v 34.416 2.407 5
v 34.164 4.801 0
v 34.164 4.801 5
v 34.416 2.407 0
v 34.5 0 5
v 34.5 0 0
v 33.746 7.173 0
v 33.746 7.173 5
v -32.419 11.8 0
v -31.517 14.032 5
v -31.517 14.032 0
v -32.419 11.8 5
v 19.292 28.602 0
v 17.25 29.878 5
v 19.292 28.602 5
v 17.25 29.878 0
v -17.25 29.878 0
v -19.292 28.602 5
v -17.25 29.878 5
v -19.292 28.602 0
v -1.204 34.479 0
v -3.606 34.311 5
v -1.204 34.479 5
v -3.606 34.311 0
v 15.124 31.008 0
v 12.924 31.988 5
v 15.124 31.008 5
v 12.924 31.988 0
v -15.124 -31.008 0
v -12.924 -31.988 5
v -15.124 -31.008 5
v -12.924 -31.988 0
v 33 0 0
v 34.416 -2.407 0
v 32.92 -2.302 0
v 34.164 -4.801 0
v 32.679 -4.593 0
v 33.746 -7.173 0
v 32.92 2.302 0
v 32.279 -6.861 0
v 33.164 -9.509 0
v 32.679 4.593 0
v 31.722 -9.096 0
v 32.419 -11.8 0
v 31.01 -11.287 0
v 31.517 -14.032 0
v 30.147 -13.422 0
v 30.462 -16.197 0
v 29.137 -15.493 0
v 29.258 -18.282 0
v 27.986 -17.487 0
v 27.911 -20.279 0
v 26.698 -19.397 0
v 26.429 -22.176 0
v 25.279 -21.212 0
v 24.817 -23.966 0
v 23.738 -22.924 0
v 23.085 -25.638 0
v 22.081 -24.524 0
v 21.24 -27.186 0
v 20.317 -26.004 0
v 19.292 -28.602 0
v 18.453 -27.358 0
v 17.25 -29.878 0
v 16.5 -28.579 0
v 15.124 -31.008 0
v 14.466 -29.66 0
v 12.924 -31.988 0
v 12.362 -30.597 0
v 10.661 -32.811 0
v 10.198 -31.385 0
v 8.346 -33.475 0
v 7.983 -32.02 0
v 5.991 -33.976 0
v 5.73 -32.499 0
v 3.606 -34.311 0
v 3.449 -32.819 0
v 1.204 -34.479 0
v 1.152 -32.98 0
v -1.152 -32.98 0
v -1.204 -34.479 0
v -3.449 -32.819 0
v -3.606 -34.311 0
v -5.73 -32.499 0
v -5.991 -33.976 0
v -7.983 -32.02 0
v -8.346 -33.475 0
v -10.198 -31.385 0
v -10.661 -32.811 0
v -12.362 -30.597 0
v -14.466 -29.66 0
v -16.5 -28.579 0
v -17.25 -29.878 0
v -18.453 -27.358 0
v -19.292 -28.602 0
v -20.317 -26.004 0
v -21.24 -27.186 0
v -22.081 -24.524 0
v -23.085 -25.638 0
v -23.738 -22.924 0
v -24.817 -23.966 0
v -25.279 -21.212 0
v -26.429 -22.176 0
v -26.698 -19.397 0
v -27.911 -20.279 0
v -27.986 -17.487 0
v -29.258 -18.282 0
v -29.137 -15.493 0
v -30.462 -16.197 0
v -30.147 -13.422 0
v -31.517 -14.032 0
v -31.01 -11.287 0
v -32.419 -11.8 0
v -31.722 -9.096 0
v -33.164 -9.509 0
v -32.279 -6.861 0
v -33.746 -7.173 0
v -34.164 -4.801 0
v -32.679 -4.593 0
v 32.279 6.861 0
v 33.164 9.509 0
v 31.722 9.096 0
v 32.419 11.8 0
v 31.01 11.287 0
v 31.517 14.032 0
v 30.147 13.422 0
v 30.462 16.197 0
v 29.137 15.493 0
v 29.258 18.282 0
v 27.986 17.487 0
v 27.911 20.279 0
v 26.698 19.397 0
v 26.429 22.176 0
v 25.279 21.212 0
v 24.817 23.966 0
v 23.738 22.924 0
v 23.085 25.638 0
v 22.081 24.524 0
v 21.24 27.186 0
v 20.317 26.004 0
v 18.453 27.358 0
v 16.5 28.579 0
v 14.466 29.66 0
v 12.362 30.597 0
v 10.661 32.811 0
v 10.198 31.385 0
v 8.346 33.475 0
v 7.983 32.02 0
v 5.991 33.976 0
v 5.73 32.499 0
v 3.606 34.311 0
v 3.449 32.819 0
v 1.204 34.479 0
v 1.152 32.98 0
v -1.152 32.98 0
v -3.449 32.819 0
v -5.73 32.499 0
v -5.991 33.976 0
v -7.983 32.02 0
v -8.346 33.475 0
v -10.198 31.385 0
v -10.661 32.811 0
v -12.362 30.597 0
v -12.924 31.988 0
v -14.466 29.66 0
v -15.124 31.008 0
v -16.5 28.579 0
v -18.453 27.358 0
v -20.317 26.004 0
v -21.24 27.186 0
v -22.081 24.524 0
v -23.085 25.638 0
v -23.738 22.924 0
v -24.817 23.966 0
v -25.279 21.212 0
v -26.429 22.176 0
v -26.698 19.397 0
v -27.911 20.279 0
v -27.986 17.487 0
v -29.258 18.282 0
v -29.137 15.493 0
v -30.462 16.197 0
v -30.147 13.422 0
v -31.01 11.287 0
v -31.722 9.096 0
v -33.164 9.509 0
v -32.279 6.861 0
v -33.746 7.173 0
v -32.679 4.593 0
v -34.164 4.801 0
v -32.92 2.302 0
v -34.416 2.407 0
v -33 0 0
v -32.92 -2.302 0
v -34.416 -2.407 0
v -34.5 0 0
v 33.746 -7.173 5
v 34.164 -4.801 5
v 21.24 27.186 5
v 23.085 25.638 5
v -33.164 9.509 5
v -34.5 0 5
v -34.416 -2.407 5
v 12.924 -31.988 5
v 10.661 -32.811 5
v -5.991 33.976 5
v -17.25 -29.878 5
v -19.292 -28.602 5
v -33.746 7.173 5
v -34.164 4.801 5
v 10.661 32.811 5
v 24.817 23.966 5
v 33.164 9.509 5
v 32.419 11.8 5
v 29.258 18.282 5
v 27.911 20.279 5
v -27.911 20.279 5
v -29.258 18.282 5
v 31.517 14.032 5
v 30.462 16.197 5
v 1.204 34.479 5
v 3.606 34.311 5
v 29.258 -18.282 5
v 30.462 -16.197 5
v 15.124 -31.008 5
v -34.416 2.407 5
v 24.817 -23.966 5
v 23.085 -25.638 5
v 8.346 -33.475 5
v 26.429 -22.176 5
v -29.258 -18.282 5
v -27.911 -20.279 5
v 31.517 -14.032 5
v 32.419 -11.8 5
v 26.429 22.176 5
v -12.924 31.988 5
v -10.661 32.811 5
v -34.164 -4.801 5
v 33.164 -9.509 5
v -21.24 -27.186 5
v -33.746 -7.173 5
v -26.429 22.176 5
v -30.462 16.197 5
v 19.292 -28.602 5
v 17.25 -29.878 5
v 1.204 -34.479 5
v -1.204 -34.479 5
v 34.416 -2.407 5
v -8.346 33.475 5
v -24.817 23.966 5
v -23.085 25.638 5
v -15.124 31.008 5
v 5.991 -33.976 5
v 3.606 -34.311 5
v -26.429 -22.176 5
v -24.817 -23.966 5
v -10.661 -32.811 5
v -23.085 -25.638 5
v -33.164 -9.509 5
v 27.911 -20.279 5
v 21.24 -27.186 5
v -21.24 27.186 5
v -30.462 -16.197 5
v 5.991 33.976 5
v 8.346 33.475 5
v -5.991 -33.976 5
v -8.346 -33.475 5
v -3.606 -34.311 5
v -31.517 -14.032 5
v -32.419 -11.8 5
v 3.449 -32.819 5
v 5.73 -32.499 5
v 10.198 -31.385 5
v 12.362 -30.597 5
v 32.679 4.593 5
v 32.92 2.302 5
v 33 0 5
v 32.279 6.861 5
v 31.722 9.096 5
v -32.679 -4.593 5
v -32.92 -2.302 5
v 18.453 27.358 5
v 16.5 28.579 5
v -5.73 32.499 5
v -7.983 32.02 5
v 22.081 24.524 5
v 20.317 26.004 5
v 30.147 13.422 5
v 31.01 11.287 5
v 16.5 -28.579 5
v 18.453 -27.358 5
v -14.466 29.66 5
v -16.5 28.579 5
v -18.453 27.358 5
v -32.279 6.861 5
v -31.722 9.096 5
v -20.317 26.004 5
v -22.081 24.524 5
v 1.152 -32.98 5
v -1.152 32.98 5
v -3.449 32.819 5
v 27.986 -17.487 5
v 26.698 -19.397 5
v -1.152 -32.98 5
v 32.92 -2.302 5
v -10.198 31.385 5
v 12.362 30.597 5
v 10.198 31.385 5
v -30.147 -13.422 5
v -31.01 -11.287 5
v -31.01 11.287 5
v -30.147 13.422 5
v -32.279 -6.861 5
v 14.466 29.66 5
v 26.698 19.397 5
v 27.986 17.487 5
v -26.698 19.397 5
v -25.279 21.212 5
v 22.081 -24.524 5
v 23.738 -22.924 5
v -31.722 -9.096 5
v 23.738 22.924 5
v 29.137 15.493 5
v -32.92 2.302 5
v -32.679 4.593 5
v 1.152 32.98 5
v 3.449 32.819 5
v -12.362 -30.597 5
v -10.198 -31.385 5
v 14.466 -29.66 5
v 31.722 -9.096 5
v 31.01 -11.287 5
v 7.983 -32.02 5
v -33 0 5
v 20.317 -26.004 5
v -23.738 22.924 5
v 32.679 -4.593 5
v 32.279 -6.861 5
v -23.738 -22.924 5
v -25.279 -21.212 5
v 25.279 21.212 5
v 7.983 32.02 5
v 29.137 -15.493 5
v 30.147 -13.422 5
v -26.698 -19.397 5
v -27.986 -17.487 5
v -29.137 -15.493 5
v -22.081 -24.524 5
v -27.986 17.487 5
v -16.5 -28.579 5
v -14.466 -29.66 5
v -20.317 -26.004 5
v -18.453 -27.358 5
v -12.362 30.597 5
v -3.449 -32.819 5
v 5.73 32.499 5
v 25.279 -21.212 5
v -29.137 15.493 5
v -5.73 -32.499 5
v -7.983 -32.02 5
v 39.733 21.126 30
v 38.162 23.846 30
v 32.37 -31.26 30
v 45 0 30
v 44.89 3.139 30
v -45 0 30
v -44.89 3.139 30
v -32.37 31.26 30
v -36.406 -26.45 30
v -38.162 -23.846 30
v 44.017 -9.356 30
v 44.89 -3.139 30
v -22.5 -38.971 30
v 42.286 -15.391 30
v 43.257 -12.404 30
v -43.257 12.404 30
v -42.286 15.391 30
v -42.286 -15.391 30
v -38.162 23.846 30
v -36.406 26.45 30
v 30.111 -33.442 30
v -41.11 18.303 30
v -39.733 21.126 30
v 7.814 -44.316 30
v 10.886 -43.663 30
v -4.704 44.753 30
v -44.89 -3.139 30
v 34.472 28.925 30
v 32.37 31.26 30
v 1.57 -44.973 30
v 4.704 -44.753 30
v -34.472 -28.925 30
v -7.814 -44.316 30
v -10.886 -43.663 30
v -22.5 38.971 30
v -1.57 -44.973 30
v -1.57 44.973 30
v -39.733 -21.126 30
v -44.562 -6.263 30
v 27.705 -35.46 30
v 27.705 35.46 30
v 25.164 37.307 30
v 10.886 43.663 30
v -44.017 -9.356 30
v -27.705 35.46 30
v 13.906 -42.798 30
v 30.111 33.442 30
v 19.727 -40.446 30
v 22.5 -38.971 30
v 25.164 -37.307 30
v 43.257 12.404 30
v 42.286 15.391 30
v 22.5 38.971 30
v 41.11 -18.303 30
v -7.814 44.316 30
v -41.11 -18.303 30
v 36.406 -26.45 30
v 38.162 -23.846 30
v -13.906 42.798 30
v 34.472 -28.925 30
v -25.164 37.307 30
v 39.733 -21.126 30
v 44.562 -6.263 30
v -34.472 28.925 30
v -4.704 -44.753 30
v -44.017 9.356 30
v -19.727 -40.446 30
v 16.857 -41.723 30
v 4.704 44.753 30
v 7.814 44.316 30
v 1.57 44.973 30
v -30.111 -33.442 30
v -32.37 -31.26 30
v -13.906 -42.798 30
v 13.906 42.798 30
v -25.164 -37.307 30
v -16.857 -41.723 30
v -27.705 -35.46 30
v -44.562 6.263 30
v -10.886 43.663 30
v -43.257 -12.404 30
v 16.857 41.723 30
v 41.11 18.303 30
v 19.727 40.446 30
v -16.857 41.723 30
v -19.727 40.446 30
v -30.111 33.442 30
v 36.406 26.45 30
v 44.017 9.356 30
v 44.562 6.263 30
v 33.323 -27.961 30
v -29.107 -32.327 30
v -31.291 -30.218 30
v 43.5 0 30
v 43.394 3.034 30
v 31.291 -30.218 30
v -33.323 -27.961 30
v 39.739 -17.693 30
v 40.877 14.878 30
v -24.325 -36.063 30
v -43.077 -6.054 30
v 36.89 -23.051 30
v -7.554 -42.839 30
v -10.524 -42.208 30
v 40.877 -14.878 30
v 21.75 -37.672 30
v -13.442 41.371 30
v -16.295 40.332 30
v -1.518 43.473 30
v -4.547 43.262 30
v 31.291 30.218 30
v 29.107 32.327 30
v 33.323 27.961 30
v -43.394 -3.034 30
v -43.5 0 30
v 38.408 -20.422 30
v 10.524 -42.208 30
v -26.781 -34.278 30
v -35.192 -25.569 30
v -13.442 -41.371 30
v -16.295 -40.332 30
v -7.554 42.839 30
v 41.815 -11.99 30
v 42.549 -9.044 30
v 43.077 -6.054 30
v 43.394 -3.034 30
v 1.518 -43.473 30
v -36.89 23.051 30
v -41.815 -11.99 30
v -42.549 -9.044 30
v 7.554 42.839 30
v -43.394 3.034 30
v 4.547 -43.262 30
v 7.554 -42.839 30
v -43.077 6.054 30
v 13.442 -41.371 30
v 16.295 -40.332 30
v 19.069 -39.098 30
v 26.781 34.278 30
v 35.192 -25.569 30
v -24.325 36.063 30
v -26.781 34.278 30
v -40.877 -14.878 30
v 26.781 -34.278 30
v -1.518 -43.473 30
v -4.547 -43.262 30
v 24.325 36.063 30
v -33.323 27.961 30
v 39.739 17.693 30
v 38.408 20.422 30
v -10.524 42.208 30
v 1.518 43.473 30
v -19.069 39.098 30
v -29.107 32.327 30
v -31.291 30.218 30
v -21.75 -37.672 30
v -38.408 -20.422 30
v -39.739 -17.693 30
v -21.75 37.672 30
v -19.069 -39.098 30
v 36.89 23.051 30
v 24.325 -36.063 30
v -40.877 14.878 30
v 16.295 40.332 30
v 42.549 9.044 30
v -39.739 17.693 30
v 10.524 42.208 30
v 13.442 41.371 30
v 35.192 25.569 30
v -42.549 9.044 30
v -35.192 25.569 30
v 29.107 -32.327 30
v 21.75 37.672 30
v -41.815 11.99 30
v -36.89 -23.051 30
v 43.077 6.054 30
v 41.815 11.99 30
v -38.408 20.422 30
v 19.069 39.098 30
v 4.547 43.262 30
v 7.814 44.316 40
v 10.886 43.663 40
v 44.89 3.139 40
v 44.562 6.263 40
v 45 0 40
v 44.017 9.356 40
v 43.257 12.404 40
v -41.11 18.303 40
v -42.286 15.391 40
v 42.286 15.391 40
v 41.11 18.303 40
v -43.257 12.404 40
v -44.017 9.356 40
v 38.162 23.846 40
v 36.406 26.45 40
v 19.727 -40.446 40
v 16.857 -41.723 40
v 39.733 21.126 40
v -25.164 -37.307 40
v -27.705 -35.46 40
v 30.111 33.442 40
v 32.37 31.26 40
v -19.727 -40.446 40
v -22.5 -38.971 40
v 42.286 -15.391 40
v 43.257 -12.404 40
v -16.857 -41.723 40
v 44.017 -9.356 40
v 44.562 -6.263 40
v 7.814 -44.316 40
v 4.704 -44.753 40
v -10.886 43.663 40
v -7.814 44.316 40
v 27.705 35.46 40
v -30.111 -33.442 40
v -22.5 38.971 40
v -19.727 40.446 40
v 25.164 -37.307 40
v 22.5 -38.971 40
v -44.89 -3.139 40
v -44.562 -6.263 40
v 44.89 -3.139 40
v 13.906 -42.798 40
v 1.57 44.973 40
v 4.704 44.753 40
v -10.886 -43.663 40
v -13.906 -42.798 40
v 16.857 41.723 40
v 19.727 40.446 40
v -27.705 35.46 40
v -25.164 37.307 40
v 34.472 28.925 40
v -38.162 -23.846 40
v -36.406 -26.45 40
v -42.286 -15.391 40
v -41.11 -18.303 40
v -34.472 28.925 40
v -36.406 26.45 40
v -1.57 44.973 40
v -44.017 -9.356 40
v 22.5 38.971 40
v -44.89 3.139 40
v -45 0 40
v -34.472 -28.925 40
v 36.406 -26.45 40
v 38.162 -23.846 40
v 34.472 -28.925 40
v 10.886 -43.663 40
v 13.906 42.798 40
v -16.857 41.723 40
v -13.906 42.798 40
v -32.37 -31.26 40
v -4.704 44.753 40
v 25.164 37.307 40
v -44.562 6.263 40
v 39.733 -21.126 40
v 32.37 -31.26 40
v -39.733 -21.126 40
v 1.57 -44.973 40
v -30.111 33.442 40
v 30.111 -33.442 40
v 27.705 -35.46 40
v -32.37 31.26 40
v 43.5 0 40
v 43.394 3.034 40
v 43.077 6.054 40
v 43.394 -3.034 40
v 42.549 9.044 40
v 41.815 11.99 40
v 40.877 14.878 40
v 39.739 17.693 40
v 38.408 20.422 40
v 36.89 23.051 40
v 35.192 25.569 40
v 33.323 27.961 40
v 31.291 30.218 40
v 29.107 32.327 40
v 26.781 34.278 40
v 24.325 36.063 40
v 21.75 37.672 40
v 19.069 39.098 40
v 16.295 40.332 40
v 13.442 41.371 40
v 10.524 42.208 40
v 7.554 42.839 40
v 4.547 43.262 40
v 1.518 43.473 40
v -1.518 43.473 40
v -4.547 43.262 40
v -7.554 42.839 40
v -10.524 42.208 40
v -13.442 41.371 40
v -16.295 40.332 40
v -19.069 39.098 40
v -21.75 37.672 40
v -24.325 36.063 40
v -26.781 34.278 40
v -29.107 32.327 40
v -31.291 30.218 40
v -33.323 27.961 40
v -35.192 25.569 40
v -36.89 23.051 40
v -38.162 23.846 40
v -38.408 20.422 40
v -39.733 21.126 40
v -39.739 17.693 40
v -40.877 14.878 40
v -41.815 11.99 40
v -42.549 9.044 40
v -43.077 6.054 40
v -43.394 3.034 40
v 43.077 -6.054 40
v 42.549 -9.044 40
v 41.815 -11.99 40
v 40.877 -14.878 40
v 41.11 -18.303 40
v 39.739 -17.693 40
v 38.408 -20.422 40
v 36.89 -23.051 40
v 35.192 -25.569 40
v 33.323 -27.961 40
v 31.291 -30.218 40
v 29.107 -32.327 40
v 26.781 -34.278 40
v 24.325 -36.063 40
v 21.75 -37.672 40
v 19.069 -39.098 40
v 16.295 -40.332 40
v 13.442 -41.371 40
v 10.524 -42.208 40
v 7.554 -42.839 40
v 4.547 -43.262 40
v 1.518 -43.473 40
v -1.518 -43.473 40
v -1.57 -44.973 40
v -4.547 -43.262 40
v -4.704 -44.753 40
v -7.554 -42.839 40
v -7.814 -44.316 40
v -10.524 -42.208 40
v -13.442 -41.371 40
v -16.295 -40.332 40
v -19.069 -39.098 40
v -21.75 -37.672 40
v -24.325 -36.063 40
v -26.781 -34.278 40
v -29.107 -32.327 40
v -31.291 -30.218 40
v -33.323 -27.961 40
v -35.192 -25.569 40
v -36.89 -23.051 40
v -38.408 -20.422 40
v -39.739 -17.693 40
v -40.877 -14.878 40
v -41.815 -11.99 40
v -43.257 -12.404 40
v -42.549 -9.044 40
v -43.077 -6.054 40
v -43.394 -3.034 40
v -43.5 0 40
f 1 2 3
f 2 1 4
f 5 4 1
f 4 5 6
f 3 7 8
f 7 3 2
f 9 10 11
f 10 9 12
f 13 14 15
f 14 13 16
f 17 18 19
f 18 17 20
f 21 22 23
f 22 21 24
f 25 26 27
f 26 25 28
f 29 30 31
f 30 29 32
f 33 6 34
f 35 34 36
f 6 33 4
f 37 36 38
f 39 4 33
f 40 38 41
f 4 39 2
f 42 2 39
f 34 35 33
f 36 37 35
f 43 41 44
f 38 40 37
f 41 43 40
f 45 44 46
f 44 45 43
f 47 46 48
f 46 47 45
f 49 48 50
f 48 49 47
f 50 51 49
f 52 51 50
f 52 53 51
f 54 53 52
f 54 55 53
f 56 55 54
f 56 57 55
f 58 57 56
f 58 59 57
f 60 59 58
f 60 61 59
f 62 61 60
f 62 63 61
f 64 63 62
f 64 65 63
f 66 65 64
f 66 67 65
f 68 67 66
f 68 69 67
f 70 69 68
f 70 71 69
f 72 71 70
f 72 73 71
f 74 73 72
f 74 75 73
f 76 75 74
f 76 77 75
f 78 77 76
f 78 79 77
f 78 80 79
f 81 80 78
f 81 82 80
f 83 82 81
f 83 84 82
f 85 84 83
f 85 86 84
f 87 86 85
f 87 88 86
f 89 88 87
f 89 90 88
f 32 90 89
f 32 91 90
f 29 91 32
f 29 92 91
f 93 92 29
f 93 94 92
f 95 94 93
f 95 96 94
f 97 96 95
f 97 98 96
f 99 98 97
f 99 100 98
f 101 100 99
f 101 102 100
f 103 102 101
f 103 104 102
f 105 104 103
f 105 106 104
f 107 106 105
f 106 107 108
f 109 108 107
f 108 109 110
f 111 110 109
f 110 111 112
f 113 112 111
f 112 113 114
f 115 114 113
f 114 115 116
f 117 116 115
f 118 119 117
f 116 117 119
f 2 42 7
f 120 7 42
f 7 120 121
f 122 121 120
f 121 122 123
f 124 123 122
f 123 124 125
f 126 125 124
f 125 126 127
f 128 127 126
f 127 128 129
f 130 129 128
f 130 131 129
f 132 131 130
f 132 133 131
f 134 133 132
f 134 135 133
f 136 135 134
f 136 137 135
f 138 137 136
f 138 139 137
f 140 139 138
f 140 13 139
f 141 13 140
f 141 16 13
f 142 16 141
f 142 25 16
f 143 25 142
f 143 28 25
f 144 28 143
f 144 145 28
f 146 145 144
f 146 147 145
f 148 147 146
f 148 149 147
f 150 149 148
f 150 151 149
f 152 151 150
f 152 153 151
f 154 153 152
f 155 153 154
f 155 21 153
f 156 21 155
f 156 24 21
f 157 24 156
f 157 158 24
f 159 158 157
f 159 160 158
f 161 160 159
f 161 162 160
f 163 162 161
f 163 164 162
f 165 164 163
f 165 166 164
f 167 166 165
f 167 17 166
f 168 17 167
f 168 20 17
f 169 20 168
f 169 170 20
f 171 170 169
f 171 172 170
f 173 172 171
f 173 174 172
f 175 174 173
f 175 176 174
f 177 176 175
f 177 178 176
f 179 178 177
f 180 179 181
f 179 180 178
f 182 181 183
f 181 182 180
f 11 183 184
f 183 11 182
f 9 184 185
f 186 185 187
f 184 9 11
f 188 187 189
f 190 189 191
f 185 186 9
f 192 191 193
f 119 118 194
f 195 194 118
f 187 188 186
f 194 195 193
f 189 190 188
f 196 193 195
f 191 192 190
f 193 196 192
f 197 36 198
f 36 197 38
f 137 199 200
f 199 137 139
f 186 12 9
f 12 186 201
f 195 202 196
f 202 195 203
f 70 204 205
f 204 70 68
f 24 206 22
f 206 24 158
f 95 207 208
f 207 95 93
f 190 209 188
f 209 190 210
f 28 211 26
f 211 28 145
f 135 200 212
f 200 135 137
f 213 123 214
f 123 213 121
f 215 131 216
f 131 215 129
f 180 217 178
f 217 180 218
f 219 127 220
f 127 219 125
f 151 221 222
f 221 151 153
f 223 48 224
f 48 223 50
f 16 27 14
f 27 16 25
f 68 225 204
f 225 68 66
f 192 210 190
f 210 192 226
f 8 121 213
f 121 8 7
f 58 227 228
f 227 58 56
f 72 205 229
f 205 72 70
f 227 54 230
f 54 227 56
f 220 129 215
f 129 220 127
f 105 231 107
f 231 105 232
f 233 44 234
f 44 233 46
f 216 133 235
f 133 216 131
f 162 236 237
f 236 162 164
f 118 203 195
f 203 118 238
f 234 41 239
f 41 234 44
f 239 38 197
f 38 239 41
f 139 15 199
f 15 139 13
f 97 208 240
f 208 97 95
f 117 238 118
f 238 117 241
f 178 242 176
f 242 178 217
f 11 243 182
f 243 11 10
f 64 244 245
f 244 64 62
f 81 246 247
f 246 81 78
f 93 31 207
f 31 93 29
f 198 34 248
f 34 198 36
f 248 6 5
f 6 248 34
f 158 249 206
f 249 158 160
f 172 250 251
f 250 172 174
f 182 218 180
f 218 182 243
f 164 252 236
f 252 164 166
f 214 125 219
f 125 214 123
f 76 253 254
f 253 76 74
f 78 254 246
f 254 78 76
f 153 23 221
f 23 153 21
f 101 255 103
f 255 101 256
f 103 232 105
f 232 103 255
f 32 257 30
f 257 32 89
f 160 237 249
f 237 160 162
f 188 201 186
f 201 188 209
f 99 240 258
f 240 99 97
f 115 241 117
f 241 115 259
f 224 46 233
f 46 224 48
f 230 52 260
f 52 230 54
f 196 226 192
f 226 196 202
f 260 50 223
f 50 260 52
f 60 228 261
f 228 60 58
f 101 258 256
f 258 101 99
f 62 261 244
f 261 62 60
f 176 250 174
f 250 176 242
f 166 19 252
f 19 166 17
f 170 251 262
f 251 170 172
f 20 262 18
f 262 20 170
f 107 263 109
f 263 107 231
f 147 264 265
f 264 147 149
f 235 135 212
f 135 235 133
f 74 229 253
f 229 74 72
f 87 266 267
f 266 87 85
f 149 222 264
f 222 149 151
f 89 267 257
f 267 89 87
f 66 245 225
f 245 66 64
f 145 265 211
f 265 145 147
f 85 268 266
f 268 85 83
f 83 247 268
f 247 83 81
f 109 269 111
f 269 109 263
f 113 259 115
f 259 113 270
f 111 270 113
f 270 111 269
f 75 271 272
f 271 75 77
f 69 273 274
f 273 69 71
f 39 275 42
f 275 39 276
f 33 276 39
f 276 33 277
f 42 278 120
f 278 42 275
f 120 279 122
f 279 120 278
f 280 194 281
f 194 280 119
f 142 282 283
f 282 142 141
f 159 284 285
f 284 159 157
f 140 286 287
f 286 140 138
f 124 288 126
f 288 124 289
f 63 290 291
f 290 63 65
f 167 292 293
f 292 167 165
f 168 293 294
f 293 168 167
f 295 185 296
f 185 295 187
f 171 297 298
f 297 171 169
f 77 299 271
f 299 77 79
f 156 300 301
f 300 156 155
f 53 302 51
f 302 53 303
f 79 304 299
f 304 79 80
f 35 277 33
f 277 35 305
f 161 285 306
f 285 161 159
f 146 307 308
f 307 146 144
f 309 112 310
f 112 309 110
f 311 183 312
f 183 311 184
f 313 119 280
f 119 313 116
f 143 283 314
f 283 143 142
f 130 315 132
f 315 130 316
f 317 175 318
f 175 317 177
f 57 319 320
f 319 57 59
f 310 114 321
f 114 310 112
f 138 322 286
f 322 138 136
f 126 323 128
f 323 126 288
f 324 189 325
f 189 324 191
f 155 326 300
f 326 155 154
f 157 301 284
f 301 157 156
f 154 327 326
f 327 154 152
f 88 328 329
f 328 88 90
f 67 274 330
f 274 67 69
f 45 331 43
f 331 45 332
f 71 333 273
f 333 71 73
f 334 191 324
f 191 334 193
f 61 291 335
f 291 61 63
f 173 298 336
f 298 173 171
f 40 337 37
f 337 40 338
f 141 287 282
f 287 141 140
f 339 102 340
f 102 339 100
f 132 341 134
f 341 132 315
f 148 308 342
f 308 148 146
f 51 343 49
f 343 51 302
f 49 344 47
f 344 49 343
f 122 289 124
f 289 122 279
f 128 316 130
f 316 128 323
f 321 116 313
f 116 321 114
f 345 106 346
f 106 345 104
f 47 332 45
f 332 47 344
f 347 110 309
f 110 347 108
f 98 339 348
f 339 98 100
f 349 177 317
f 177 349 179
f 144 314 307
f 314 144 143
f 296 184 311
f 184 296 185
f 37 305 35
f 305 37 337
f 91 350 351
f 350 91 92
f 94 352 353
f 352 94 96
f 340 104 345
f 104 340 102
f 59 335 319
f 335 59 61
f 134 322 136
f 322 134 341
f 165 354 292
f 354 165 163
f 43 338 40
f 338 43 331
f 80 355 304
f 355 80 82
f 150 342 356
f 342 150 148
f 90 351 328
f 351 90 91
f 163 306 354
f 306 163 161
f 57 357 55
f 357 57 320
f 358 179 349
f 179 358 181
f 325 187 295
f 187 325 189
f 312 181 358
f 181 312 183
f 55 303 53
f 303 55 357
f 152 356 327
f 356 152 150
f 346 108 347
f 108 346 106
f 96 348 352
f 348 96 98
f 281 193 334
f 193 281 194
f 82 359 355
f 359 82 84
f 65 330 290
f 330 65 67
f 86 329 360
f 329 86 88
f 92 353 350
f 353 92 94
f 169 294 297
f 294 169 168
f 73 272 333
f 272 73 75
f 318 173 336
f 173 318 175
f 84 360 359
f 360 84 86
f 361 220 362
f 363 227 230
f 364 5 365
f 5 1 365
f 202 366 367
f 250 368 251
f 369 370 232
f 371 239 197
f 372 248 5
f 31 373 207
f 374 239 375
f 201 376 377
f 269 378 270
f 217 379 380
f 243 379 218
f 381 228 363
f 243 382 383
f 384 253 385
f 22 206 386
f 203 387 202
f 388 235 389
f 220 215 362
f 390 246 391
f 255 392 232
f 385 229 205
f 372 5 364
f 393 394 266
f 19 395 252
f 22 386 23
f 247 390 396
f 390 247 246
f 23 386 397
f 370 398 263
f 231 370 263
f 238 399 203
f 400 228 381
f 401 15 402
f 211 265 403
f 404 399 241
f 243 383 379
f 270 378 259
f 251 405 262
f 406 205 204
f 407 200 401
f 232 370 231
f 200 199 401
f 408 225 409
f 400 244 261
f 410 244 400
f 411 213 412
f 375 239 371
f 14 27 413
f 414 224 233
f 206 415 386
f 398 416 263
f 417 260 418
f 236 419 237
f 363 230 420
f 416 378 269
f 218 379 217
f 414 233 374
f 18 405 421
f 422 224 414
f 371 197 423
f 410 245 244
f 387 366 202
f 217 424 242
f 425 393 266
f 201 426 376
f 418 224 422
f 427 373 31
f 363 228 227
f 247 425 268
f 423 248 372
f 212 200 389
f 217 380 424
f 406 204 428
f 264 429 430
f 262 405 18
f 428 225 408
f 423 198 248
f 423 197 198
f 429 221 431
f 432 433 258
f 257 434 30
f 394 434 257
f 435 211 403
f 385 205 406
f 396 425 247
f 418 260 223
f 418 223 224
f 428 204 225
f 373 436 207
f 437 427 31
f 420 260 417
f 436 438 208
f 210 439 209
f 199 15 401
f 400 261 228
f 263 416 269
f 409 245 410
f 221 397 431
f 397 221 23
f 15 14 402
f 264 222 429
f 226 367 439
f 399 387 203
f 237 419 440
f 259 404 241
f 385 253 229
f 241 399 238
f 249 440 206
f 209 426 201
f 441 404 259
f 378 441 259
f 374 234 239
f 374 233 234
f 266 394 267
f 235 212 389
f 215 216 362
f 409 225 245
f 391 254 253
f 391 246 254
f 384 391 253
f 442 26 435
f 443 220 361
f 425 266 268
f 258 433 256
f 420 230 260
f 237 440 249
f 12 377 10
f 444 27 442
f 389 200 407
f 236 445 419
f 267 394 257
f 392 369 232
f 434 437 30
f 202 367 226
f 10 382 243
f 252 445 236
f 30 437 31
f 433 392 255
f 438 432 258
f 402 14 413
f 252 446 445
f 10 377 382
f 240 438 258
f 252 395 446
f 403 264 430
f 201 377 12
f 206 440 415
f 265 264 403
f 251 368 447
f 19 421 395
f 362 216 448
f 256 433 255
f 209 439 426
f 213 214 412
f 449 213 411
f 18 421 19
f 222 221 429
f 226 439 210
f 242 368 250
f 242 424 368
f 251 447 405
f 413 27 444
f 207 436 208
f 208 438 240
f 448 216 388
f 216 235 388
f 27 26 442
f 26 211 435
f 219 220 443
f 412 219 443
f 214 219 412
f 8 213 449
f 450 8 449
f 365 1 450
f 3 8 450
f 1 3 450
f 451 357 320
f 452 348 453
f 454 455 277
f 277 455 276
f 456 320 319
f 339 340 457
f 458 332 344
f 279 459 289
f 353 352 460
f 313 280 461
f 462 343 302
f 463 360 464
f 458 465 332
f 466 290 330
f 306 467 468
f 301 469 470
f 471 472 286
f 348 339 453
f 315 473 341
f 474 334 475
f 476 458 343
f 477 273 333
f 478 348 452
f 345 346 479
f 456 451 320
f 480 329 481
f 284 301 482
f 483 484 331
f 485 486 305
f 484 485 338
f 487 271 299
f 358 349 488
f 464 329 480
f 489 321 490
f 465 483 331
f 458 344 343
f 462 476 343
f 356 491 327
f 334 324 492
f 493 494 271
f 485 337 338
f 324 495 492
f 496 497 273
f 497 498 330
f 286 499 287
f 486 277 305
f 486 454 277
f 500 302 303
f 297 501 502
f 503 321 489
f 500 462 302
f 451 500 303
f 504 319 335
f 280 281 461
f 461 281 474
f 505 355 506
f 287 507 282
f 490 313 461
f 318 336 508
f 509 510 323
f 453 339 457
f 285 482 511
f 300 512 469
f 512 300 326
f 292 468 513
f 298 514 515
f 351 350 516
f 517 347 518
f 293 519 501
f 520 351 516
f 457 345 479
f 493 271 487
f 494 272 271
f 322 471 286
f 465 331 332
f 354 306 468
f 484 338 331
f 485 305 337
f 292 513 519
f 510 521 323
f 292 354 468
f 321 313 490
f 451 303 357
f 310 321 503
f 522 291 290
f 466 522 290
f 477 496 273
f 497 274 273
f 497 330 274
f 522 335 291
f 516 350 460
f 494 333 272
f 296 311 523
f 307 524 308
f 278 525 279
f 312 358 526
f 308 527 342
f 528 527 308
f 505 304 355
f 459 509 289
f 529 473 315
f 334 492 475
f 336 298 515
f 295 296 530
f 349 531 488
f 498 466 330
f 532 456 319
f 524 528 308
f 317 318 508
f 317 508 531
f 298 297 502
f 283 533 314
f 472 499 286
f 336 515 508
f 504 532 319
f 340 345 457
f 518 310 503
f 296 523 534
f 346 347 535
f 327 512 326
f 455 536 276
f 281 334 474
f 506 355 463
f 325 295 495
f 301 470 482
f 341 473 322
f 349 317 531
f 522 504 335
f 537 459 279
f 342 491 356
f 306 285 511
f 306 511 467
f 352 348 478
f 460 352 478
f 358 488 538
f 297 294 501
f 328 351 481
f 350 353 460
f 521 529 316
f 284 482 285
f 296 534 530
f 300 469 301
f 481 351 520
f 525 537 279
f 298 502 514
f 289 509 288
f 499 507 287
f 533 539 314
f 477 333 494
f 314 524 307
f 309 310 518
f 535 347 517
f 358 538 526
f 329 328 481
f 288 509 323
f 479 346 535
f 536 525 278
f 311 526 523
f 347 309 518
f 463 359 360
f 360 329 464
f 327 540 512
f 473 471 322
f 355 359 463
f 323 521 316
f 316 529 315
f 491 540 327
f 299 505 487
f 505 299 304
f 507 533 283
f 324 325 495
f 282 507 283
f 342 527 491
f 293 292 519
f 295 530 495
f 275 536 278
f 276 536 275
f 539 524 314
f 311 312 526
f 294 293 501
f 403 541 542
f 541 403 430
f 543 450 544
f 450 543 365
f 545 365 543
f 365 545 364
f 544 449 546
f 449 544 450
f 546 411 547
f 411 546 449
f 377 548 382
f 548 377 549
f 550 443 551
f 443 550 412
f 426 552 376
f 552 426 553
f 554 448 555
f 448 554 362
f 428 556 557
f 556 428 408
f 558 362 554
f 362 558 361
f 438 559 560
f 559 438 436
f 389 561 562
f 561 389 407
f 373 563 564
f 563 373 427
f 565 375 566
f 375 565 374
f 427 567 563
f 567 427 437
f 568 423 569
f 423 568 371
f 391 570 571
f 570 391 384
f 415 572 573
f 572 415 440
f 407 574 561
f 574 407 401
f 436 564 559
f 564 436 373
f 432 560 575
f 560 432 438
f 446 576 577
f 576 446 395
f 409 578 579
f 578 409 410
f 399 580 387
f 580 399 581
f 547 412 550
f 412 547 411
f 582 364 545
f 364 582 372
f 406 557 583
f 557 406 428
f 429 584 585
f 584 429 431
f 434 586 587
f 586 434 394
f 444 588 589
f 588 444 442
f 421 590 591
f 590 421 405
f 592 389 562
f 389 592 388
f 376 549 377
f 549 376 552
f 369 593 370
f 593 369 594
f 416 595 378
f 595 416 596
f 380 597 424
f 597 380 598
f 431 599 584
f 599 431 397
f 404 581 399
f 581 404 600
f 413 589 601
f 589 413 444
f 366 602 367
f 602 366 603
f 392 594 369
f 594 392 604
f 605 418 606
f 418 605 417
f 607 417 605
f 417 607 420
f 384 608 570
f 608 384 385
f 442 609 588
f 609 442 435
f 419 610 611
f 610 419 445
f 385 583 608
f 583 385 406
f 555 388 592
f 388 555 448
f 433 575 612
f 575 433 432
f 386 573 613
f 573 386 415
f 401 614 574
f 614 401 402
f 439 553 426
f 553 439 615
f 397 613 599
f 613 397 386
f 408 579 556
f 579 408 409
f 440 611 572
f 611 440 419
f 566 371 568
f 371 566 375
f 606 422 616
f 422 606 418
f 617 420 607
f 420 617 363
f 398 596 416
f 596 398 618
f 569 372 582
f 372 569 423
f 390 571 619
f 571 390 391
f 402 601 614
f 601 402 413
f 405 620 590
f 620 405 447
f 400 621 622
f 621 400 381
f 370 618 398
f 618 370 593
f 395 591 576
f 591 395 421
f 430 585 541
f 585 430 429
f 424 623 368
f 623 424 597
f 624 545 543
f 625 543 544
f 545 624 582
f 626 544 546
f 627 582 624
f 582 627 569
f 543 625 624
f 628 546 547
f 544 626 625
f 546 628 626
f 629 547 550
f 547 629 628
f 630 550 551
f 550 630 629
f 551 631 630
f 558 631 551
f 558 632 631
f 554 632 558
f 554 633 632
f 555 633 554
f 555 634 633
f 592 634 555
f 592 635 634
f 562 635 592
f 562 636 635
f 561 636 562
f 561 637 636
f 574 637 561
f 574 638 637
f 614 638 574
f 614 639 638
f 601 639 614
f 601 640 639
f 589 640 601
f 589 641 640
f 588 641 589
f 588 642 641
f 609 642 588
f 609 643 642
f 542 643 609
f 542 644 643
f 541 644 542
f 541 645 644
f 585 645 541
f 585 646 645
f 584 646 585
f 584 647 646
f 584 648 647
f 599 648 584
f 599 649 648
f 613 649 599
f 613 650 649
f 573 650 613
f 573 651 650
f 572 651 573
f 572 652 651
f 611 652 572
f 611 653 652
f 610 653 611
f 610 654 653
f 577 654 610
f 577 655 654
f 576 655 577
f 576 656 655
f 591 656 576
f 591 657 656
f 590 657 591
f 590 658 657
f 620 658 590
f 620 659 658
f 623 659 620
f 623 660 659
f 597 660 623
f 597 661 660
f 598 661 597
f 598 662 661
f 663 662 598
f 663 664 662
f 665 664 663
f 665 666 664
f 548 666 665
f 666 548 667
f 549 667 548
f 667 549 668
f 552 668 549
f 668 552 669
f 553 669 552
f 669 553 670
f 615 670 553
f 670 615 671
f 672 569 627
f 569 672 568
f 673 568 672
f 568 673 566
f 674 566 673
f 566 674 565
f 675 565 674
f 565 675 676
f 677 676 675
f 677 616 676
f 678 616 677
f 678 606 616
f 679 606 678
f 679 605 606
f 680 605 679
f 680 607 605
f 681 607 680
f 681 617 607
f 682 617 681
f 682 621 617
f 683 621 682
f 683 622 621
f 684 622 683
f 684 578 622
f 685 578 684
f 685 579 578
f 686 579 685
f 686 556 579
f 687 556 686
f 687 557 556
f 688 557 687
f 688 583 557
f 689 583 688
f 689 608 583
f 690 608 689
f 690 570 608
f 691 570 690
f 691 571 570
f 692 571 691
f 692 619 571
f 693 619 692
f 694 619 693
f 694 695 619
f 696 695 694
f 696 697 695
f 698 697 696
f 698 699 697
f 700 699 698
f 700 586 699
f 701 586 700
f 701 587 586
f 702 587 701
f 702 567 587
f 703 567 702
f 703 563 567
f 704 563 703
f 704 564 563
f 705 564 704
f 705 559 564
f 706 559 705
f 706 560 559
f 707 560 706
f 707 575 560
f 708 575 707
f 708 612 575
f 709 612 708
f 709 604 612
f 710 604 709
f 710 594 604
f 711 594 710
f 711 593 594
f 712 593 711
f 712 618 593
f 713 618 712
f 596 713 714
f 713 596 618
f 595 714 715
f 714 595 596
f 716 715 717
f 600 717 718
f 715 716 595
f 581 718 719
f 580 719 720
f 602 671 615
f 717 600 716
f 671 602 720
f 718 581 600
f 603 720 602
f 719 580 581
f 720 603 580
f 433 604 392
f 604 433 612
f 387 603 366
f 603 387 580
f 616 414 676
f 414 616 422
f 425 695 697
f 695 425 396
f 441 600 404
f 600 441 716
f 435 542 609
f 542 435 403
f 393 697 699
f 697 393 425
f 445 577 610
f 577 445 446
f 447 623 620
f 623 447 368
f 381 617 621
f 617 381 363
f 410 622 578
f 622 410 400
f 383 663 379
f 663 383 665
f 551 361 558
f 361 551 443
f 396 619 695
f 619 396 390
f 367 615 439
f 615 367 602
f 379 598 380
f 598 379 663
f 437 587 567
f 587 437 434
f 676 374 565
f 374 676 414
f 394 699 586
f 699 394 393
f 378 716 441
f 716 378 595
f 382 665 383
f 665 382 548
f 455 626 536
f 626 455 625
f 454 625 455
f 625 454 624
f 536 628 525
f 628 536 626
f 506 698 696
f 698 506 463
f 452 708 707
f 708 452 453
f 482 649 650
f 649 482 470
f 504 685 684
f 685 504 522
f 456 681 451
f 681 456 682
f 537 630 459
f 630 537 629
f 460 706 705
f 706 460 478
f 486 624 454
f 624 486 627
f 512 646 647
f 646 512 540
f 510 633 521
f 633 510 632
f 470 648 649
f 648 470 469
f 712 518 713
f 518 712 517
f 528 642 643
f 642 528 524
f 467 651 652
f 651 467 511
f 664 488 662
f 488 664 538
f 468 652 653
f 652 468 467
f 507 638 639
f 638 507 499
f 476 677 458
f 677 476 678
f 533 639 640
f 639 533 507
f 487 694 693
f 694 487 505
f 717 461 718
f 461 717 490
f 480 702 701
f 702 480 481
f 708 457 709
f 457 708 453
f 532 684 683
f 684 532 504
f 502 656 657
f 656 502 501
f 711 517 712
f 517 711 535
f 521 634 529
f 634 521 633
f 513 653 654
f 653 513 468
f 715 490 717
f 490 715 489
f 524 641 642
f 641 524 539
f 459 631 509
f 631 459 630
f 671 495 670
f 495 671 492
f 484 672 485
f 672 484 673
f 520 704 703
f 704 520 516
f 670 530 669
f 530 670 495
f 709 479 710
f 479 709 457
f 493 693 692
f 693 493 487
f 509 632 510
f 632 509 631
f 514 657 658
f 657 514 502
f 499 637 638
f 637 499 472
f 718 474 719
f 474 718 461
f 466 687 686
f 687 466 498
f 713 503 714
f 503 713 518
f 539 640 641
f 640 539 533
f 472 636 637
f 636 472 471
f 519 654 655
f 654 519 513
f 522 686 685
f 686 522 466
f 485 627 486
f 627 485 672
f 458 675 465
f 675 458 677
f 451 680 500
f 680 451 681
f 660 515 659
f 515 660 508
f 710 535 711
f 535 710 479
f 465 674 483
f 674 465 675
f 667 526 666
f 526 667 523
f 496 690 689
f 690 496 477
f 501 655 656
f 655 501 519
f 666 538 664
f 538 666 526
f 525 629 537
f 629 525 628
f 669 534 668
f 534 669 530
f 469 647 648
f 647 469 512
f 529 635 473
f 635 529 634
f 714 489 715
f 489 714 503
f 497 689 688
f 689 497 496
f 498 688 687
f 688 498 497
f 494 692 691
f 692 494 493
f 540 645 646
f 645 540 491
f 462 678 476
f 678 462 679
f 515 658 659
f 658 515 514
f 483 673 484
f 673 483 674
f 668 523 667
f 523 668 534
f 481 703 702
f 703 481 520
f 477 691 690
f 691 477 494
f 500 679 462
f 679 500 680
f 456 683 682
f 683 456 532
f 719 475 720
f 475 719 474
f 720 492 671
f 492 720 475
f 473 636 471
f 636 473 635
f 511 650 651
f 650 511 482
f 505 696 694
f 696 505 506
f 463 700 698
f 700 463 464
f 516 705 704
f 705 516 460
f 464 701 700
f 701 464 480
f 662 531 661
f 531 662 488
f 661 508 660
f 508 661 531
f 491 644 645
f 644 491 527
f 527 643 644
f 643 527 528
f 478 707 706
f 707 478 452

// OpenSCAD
// [FL_INDEX: keywords="openscad, 3d_parametric, Parameterised_tube_coupling_generator, csg_solid" | COT="Parametric OpenSCAD design from 3DCodeverse"]
// Title: Parameterised tube coupling generator

//Parameterised coupling generator
// Glyn Cowles Mar/Apr 2013


//Thickness of tube walls 
thickness=1.5; 
//Outside diameter of bottom tube 
d1=69;   
//Height of bottom tube 
h1=5;   
//Outside diameter of top tube
d2=90;   
//Height of top tube
h2=10;   
//Height of connector section
c_ht=25; 
// resolution
$fn=90;
assemble(); 
//-----------------------------------------------------------------------
module tube(d,h) {
rad=d/2;
difference() {
cylinder(h=h,r=rad);
cylinder(h=h,r=rad-thickness);
}
}
//-----------------------------------------------------------------------

module connector(){
difference() {
 cylinder (h=c_ht,r1=d1/2,r2=d2/2);
 cylinder (h=c_ht,r1=d1/2-thickness,r2=d2/2-thickness);
}
}

module assemble() {
union() {
	tube(d1,h1);
	translate([0,0,h1]) connector(); 
	translate([0,0,h1+c_ht])  tube(d2,h2);
	}
};
